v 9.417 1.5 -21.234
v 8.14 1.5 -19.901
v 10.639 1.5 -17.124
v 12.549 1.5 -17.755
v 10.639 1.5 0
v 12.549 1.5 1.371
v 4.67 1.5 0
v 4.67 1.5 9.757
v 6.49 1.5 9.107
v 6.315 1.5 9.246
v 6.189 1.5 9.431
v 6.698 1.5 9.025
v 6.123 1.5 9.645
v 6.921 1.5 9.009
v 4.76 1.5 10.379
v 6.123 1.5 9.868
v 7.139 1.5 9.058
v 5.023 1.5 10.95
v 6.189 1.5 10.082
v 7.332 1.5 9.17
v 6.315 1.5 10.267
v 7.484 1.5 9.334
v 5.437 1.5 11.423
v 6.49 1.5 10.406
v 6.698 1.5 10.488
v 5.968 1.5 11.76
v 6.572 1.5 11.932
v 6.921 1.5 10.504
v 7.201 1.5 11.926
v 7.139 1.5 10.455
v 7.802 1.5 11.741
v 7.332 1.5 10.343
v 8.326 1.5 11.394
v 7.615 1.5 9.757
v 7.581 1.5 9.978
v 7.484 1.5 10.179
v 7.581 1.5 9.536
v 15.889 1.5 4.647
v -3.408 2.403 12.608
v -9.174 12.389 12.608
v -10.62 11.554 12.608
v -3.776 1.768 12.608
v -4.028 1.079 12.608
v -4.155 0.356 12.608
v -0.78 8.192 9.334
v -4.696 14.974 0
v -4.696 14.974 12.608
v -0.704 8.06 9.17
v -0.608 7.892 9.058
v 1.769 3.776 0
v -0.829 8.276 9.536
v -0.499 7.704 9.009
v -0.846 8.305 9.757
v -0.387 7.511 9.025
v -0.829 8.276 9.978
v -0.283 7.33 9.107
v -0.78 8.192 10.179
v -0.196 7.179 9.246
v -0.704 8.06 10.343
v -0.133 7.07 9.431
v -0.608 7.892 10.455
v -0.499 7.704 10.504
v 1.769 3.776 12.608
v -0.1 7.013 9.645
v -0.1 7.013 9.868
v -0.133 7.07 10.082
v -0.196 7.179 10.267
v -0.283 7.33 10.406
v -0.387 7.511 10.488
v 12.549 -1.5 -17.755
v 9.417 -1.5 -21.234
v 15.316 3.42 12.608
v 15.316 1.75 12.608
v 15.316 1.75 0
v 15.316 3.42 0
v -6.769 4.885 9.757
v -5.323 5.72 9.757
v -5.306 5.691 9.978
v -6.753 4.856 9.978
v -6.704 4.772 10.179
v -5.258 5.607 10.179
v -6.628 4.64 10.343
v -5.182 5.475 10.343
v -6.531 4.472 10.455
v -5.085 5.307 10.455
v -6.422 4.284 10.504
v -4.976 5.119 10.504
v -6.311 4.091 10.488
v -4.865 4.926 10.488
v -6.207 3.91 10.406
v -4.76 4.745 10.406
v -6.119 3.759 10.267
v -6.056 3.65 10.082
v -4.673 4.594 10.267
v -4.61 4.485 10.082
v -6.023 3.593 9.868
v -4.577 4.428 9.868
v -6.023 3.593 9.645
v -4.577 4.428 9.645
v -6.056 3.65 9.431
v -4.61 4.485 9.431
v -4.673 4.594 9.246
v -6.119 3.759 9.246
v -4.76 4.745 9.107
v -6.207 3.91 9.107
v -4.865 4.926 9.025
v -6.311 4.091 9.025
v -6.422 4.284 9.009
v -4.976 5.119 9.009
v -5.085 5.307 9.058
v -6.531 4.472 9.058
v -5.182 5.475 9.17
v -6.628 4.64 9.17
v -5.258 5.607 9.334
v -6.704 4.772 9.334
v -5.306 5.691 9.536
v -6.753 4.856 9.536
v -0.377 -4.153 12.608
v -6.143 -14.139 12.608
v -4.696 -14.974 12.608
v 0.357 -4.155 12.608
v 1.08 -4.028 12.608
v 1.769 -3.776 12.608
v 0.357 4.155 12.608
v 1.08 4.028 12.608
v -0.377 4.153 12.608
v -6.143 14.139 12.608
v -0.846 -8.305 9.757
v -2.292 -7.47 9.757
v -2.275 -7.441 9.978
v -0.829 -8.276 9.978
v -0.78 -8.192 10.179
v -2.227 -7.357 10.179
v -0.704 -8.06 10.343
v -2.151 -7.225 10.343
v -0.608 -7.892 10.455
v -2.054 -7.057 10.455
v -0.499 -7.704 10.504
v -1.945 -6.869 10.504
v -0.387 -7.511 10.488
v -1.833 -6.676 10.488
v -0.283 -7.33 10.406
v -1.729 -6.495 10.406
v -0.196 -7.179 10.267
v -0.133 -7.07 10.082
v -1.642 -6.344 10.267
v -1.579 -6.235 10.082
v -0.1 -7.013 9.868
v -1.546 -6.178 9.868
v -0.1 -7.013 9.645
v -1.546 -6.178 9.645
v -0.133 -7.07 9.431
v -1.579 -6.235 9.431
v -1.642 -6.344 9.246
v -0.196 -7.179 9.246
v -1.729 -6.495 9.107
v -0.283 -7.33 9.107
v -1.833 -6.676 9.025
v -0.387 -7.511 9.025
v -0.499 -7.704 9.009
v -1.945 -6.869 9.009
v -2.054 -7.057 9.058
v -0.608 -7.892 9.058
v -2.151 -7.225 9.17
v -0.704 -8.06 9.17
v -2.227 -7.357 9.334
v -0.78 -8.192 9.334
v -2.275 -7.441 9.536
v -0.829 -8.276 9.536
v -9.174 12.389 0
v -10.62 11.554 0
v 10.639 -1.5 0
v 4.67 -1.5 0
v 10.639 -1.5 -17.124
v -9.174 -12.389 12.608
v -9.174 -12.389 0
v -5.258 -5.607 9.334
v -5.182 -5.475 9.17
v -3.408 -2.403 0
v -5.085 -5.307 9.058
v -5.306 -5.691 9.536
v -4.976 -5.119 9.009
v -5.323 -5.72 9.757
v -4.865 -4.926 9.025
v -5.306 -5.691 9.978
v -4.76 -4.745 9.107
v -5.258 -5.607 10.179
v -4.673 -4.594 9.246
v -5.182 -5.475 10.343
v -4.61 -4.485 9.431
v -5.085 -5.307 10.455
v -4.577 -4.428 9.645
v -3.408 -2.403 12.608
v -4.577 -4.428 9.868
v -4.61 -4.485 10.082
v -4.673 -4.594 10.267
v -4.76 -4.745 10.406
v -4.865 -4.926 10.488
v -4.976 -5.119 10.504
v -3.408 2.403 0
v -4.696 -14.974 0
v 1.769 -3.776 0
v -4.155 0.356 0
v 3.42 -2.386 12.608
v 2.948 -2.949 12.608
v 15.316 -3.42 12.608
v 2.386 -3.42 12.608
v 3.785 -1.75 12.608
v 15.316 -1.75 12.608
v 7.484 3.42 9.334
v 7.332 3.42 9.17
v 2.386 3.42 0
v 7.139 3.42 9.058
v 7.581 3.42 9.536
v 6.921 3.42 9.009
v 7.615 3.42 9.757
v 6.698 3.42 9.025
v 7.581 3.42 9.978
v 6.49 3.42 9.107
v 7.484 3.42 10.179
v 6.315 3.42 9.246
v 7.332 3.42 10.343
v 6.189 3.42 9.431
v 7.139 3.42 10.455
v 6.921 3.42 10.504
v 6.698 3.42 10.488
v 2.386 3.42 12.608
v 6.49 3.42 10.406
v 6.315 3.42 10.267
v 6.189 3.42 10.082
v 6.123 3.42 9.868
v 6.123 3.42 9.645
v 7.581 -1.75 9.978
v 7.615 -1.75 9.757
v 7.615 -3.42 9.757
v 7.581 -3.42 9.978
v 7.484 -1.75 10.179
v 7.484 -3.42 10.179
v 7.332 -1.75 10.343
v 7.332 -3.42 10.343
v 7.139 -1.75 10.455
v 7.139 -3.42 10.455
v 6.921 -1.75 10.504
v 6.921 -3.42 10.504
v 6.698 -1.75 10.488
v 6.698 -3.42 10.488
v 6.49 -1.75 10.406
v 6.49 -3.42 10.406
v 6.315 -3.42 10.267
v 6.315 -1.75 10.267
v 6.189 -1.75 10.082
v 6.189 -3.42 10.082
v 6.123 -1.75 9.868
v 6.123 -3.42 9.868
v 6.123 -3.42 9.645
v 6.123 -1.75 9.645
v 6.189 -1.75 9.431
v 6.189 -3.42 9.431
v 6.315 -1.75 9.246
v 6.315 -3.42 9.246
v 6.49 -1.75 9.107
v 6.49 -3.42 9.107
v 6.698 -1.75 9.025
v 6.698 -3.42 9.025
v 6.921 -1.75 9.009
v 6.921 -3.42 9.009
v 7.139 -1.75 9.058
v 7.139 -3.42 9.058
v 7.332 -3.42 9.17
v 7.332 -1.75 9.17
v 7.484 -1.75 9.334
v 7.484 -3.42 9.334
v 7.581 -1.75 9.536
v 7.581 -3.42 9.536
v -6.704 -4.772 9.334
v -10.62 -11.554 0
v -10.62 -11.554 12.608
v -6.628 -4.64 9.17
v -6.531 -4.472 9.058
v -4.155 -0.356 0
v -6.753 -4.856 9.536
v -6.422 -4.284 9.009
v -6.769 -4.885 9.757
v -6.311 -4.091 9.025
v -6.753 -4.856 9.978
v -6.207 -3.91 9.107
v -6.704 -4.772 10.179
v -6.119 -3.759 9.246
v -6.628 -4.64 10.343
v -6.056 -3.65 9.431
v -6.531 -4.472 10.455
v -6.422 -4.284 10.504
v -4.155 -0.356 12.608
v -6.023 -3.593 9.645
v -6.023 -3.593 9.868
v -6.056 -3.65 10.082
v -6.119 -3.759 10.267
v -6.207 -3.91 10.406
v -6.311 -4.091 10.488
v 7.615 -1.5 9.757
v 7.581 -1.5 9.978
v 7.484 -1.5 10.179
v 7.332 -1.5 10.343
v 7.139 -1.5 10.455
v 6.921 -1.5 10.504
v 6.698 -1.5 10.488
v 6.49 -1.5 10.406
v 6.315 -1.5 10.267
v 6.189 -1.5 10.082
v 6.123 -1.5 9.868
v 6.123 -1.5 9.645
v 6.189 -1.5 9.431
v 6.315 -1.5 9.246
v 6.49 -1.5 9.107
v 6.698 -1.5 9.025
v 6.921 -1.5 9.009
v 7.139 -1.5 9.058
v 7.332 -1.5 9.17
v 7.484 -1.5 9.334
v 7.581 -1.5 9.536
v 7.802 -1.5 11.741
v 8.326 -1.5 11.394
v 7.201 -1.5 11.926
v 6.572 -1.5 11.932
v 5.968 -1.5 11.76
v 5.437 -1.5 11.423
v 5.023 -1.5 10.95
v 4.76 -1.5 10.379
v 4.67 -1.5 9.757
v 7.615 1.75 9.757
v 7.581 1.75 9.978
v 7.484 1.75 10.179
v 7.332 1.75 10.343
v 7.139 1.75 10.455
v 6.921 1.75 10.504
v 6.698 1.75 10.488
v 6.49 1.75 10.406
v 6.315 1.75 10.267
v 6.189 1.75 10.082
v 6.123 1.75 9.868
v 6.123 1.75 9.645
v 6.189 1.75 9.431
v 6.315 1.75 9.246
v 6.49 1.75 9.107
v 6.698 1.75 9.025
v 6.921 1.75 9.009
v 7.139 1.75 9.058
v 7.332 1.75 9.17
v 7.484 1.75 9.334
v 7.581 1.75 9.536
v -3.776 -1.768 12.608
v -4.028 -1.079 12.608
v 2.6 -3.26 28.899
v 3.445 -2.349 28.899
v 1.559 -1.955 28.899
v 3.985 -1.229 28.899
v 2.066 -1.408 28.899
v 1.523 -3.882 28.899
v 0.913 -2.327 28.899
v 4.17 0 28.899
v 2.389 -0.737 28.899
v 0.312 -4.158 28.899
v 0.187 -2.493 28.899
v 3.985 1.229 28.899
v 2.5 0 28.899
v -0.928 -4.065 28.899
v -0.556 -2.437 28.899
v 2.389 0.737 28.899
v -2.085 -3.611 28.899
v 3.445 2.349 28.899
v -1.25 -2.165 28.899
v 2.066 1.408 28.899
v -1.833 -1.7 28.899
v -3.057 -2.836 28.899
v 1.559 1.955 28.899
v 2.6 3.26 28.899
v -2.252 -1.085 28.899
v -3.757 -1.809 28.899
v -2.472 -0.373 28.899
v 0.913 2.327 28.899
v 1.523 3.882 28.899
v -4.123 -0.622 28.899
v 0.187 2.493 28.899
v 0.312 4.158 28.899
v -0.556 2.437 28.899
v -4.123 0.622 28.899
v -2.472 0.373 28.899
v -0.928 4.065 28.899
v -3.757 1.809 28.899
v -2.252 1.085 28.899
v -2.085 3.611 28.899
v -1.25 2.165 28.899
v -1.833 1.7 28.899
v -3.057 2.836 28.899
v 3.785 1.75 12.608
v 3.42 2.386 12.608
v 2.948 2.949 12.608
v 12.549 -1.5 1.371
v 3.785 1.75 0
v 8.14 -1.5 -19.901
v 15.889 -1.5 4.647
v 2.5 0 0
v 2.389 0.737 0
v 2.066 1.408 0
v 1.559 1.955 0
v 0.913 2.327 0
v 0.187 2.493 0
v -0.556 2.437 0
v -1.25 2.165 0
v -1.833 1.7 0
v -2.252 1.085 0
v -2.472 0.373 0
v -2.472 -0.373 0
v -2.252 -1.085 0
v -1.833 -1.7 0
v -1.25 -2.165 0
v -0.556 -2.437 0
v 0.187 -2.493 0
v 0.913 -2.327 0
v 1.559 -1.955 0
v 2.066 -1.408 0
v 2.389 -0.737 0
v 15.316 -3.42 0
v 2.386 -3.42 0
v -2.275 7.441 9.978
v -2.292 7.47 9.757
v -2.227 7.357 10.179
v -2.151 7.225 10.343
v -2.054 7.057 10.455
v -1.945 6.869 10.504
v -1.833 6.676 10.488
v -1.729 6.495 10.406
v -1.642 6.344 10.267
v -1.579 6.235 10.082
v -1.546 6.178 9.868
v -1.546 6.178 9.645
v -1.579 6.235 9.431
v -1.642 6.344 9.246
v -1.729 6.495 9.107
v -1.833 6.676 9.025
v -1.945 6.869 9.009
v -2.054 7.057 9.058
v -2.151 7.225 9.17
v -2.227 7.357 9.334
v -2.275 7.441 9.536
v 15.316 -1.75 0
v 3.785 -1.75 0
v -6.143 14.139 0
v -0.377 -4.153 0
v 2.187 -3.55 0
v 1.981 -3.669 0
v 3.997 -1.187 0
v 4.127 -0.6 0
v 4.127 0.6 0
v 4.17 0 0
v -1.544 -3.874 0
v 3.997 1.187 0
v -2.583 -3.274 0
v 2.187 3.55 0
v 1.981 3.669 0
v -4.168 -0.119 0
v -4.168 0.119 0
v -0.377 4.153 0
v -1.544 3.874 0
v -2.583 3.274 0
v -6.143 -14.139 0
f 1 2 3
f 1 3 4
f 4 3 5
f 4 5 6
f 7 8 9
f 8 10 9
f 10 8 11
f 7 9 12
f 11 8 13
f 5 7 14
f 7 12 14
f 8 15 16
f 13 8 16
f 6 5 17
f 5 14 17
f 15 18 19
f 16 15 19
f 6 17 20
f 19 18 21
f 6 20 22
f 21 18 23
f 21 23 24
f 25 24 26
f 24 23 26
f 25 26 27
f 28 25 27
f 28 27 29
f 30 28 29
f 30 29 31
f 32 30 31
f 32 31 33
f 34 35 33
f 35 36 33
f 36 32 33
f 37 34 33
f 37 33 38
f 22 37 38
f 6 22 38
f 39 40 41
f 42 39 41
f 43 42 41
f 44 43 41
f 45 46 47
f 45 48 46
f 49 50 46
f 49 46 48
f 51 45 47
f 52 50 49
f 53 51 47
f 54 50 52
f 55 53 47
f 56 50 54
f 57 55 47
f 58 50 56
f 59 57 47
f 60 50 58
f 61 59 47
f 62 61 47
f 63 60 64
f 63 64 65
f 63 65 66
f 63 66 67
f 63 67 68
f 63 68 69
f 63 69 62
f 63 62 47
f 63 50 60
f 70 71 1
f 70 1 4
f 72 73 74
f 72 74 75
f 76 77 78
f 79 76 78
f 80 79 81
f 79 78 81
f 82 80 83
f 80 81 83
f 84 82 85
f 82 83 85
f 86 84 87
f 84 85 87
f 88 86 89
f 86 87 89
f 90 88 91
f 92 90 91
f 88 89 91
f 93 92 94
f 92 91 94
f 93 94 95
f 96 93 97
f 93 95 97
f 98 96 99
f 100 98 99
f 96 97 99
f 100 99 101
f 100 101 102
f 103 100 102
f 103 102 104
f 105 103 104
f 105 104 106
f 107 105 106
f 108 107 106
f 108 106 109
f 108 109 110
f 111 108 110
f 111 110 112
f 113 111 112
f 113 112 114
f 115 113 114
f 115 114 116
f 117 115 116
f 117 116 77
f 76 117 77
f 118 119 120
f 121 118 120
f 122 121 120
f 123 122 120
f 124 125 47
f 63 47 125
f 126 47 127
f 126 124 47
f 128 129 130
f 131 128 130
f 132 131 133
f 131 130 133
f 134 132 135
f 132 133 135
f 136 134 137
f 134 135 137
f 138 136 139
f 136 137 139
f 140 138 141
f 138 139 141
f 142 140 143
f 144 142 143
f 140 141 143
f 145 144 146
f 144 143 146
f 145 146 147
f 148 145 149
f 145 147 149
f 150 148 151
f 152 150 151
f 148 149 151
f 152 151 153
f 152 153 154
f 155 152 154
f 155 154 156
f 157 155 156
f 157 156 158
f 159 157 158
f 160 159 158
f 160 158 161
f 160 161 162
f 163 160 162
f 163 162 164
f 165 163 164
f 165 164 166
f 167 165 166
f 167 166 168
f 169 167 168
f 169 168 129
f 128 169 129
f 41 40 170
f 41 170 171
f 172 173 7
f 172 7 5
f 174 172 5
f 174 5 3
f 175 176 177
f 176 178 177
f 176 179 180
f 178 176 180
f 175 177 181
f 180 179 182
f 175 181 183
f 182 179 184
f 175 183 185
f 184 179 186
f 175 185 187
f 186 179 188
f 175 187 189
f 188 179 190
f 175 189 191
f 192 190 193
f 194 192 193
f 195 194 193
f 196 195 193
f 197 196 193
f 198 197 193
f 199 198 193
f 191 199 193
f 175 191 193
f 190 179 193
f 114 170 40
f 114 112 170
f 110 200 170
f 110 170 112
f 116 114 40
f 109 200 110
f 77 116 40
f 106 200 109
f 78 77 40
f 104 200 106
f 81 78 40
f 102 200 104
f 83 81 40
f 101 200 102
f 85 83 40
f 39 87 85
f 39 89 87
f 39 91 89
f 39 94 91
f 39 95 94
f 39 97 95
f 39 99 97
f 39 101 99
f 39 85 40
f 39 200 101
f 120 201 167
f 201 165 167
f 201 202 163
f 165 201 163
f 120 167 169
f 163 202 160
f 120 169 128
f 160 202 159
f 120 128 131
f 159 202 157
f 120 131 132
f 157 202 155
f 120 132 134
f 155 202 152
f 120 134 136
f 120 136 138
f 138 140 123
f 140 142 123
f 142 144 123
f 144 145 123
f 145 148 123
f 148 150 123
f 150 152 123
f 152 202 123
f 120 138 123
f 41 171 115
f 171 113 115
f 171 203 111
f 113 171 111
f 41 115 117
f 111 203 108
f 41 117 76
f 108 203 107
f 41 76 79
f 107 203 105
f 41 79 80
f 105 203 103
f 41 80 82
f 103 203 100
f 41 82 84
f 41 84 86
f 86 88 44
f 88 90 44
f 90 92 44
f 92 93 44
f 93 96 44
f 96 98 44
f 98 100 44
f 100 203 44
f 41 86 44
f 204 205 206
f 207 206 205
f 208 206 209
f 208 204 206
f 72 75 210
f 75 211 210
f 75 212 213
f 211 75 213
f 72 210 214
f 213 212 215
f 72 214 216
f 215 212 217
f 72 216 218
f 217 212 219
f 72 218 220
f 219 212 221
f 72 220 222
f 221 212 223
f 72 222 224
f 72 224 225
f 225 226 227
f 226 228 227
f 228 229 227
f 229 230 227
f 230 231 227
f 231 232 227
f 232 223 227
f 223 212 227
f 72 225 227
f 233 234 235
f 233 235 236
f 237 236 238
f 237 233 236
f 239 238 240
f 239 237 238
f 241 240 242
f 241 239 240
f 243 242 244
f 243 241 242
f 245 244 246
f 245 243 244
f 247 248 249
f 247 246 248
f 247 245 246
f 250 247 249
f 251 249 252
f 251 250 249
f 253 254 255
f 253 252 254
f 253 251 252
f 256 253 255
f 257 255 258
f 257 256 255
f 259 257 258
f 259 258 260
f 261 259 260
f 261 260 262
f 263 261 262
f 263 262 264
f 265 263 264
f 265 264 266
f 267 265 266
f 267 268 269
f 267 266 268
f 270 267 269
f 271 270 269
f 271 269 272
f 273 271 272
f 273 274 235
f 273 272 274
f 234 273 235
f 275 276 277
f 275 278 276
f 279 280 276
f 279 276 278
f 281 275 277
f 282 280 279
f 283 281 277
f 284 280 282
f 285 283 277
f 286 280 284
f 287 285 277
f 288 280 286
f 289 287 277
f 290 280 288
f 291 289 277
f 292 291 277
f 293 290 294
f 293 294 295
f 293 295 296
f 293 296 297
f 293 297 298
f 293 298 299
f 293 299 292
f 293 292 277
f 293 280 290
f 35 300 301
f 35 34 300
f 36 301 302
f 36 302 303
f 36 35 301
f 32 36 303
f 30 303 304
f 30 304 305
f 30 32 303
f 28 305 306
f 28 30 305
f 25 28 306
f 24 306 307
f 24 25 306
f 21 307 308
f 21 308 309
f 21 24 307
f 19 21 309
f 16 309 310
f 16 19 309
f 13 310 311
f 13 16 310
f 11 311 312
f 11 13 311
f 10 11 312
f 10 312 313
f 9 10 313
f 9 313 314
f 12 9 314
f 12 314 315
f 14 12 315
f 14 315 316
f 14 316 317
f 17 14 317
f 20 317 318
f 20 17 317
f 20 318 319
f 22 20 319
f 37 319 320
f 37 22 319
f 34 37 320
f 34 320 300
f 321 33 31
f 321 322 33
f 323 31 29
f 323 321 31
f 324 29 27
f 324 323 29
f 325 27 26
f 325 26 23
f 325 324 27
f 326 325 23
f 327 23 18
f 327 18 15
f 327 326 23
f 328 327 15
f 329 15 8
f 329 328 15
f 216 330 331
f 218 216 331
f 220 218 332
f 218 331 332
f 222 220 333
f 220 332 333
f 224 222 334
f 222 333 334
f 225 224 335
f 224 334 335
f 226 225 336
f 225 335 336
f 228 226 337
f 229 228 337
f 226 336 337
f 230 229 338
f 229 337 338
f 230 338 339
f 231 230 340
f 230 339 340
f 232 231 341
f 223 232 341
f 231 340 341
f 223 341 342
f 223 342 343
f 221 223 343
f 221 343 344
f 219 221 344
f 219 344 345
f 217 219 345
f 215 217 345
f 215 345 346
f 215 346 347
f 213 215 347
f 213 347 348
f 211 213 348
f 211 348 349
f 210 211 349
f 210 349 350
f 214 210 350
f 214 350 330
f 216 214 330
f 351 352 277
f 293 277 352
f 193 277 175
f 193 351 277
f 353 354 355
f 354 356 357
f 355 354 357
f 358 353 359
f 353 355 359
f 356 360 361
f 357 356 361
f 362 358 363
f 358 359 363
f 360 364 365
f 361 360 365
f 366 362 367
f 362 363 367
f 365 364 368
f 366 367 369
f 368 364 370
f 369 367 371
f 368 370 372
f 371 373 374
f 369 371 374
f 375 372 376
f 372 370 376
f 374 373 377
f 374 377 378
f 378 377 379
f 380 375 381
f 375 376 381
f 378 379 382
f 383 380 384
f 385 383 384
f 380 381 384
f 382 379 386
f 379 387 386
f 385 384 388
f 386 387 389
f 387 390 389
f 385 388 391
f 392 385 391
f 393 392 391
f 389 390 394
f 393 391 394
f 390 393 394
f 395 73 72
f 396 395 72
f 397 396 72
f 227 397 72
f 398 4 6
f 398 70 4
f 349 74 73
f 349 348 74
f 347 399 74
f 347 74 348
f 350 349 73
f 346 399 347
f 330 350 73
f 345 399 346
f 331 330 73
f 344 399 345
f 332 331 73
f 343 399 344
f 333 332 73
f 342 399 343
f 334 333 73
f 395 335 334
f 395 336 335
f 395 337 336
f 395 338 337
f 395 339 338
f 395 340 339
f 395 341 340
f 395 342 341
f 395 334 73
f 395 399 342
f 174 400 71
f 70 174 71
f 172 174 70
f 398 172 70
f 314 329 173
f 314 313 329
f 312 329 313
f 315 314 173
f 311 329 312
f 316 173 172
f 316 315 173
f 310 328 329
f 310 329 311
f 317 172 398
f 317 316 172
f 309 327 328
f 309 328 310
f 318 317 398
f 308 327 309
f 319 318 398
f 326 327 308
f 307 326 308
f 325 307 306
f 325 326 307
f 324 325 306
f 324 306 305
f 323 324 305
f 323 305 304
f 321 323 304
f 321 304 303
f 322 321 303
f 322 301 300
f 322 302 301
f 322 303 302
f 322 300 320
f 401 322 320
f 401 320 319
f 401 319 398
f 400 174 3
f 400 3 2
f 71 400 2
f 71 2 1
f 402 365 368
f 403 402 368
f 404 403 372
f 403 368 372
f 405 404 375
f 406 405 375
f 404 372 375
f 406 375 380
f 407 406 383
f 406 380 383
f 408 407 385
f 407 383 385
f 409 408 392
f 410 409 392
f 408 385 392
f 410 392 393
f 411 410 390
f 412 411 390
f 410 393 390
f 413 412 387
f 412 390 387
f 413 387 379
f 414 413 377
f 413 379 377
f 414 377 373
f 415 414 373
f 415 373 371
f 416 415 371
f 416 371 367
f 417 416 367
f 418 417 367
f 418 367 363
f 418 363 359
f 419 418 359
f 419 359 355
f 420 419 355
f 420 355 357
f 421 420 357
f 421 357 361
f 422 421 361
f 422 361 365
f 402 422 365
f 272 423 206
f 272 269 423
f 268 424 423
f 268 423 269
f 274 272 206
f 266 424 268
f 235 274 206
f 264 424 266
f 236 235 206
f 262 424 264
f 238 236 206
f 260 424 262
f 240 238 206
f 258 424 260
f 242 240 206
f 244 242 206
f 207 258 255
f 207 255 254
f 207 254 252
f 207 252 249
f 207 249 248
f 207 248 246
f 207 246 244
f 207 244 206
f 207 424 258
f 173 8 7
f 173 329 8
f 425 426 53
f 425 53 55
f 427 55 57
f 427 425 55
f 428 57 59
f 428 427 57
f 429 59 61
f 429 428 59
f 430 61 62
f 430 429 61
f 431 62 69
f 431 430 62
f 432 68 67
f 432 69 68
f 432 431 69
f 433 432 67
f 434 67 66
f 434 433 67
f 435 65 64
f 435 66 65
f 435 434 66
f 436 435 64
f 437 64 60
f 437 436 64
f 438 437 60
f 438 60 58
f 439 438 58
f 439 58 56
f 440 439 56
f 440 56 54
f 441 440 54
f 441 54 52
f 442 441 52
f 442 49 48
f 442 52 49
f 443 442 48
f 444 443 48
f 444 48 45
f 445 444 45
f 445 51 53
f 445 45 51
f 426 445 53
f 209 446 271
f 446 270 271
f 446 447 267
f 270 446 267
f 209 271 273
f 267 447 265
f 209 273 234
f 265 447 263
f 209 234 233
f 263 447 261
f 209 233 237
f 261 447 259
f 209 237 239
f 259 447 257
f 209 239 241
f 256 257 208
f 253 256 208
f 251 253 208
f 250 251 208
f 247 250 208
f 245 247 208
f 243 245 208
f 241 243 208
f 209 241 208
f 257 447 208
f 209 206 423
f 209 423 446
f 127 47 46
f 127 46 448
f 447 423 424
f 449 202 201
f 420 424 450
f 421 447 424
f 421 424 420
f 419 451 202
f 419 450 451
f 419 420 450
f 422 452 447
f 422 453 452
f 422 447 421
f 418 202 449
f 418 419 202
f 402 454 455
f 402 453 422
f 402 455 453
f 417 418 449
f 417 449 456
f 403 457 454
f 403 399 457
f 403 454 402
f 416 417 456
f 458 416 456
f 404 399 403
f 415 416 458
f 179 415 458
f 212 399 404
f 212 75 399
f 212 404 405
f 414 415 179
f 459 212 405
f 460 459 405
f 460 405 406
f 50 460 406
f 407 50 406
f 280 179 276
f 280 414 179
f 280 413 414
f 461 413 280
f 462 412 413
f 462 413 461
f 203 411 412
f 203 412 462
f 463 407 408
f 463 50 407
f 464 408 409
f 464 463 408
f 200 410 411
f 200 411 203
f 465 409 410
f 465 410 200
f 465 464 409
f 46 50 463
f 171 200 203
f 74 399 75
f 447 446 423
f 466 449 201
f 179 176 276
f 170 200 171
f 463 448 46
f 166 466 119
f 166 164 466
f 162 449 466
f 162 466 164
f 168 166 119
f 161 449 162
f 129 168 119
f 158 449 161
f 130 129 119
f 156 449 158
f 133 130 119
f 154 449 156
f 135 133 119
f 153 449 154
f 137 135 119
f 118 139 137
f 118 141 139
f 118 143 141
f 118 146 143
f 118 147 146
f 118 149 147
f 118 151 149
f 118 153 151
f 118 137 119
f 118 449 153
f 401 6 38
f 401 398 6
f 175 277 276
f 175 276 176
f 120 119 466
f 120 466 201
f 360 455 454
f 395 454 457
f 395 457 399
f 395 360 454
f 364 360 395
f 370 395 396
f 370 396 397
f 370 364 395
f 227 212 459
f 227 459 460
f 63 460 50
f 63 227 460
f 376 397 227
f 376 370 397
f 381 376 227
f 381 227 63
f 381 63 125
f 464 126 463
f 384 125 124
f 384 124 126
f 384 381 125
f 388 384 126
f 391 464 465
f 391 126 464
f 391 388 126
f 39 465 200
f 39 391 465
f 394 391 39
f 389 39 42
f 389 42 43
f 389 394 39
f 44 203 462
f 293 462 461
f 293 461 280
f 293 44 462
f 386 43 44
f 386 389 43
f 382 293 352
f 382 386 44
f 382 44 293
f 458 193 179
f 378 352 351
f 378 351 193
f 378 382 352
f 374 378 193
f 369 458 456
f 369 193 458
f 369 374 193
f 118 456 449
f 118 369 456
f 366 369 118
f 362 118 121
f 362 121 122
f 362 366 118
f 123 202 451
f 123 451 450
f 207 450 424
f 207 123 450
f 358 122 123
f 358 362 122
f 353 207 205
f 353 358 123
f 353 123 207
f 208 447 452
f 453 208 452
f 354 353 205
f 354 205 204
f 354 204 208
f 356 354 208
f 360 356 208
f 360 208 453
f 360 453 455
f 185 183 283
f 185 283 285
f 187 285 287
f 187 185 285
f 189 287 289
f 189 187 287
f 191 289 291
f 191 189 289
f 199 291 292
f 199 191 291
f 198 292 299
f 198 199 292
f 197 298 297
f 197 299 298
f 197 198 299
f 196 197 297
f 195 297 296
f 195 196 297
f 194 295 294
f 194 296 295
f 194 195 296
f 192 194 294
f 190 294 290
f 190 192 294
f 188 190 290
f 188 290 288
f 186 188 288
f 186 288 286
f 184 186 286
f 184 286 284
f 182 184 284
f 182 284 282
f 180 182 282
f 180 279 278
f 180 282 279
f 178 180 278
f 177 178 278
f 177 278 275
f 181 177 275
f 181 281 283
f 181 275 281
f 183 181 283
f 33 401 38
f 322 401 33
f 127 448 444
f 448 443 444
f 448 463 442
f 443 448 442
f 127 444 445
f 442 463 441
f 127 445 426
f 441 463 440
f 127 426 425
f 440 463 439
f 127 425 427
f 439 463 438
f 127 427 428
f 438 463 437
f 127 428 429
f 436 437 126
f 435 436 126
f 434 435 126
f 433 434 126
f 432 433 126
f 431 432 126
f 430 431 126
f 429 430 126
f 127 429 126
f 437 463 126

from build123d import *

# Parameters (mm, degrees)
F0_R          = 0.75
F1_DEPTH      = 1.5
F0_W          = 1.67
F0_H          = 28.8994106865
F4_START      = 2.02598
F3_W          = 1.67
F3_H          = 12.607557092
F4_DEPTH      = 13.29047
F5_DEPTH      = 4.171
F5_DEPTH_BACK = 4.171
F6_COUNT      = 3
F6_ANGLE      = 240


with BuildPart() as f1:
    # F0 (on Front) → F1 (new body, symmetric)
    with BuildSketch(Plane.XZ):
        with BuildLine():
            ThreePointArc((8.3259478516, 11.3943462091), (8.867825013, 10.6538749035), (9.0596246932, 9.7565781325))
            ThreePointArc((9.0596246932, 9.7565781325), (6.8648123466, 7.5617657859), (4.67, 9.7565781325))
            Line((4.67, 9.7565781325), (4.67, 0))
            Line((4.67, 0), (10.6390506752, 0))
            Line((10.6390506752, 0), (10.6390506752, -17.1242297017))
            Line((10.6390506752, -17.1242297017), (8.1397524826, -19.9012287282))
            Line((8.1397524826, -19.9012287282), (9.4171712898, -21.2341878884))
            Line((9.4171712898, -21.2341878884), (12.5488880715, -17.7545012787))
            Line((12.5488880715, -17.7545012787), (12.5488880715, 1.3705757358))
            Line((12.5488880715, 1.3705757358), (15.88907169, 4.6469019726))
            Line((15.88907169, 4.6469019726), (8.3259478516, 11.3943462091))
        make_face()
        with BuildLine():
            ThreePointArc((4.67, 9.7565781325), (6.8648123466, 7.5617657859), (9.0596246932, 9.7565781325))
            ThreePointArc((9.0596246932, 9.7565781325), (8.867825013, 10.6538749035), (8.3259478516, 11.3943462091))
            ThreePointArc((8.3259478516, 11.3943462091), (5.9675155757, 11.7595907989), (4.67, 9.7565781325))
        make_face()
        with Locations((6.8648123466, 9.7565781325)):
            Circle(F0_R, mode=Mode.SUBTRACT)
    extrude(amount=F1_DEPTH, both=True)


with BuildPart() as f2:
    # F0 (on Front) → F2 (revolve)
    with BuildSketch(Plane.XZ):
        with Locations((3.335, 14.4497053433)):
            Rectangle(F0_W, F0_H)
    revolve(axis=Axis((0, 0, 14.4497053433), (0, 0, 1)))

    # F3 (on Right) → F4 (join)
    with BuildSketch(Plane.YZ.offset(F4_START)):
        with Locations((2.585, 6.303778546)):
            Rectangle(F3_W, F3_H)
        with Locations((-2.585, 6.303778546)):
            Rectangle(F3_W, F3_H)
    extrude(amount=F4_DEPTH)

    # F0 (on Front) → F5 (cut, two sides)
    with BuildSketch(Plane.XZ) as f5_sk:
        with Locations((6.8648123466, 9.7565781325)):
            Circle(F0_R)
    extrude(amount=-F5_DEPTH, mode=Mode.SUBTRACT)
    extrude(f5_sk.sketch, amount=F5_DEPTH_BACK, mode=Mode.SUBTRACT)

    # F6: F2 ×3 about axis
    f6_axis = Axis((0, 0, 14.4497053433), (0, 0, 1))


with BuildPart() as f2_1:
    add(f2.part)
    for i in range(1, F6_COUNT):
        add(f2.part.rotate(f6_axis, i * F6_ANGLE / (F6_COUNT - 1)))


solid = Compound([f1.part, f2_1.part])
